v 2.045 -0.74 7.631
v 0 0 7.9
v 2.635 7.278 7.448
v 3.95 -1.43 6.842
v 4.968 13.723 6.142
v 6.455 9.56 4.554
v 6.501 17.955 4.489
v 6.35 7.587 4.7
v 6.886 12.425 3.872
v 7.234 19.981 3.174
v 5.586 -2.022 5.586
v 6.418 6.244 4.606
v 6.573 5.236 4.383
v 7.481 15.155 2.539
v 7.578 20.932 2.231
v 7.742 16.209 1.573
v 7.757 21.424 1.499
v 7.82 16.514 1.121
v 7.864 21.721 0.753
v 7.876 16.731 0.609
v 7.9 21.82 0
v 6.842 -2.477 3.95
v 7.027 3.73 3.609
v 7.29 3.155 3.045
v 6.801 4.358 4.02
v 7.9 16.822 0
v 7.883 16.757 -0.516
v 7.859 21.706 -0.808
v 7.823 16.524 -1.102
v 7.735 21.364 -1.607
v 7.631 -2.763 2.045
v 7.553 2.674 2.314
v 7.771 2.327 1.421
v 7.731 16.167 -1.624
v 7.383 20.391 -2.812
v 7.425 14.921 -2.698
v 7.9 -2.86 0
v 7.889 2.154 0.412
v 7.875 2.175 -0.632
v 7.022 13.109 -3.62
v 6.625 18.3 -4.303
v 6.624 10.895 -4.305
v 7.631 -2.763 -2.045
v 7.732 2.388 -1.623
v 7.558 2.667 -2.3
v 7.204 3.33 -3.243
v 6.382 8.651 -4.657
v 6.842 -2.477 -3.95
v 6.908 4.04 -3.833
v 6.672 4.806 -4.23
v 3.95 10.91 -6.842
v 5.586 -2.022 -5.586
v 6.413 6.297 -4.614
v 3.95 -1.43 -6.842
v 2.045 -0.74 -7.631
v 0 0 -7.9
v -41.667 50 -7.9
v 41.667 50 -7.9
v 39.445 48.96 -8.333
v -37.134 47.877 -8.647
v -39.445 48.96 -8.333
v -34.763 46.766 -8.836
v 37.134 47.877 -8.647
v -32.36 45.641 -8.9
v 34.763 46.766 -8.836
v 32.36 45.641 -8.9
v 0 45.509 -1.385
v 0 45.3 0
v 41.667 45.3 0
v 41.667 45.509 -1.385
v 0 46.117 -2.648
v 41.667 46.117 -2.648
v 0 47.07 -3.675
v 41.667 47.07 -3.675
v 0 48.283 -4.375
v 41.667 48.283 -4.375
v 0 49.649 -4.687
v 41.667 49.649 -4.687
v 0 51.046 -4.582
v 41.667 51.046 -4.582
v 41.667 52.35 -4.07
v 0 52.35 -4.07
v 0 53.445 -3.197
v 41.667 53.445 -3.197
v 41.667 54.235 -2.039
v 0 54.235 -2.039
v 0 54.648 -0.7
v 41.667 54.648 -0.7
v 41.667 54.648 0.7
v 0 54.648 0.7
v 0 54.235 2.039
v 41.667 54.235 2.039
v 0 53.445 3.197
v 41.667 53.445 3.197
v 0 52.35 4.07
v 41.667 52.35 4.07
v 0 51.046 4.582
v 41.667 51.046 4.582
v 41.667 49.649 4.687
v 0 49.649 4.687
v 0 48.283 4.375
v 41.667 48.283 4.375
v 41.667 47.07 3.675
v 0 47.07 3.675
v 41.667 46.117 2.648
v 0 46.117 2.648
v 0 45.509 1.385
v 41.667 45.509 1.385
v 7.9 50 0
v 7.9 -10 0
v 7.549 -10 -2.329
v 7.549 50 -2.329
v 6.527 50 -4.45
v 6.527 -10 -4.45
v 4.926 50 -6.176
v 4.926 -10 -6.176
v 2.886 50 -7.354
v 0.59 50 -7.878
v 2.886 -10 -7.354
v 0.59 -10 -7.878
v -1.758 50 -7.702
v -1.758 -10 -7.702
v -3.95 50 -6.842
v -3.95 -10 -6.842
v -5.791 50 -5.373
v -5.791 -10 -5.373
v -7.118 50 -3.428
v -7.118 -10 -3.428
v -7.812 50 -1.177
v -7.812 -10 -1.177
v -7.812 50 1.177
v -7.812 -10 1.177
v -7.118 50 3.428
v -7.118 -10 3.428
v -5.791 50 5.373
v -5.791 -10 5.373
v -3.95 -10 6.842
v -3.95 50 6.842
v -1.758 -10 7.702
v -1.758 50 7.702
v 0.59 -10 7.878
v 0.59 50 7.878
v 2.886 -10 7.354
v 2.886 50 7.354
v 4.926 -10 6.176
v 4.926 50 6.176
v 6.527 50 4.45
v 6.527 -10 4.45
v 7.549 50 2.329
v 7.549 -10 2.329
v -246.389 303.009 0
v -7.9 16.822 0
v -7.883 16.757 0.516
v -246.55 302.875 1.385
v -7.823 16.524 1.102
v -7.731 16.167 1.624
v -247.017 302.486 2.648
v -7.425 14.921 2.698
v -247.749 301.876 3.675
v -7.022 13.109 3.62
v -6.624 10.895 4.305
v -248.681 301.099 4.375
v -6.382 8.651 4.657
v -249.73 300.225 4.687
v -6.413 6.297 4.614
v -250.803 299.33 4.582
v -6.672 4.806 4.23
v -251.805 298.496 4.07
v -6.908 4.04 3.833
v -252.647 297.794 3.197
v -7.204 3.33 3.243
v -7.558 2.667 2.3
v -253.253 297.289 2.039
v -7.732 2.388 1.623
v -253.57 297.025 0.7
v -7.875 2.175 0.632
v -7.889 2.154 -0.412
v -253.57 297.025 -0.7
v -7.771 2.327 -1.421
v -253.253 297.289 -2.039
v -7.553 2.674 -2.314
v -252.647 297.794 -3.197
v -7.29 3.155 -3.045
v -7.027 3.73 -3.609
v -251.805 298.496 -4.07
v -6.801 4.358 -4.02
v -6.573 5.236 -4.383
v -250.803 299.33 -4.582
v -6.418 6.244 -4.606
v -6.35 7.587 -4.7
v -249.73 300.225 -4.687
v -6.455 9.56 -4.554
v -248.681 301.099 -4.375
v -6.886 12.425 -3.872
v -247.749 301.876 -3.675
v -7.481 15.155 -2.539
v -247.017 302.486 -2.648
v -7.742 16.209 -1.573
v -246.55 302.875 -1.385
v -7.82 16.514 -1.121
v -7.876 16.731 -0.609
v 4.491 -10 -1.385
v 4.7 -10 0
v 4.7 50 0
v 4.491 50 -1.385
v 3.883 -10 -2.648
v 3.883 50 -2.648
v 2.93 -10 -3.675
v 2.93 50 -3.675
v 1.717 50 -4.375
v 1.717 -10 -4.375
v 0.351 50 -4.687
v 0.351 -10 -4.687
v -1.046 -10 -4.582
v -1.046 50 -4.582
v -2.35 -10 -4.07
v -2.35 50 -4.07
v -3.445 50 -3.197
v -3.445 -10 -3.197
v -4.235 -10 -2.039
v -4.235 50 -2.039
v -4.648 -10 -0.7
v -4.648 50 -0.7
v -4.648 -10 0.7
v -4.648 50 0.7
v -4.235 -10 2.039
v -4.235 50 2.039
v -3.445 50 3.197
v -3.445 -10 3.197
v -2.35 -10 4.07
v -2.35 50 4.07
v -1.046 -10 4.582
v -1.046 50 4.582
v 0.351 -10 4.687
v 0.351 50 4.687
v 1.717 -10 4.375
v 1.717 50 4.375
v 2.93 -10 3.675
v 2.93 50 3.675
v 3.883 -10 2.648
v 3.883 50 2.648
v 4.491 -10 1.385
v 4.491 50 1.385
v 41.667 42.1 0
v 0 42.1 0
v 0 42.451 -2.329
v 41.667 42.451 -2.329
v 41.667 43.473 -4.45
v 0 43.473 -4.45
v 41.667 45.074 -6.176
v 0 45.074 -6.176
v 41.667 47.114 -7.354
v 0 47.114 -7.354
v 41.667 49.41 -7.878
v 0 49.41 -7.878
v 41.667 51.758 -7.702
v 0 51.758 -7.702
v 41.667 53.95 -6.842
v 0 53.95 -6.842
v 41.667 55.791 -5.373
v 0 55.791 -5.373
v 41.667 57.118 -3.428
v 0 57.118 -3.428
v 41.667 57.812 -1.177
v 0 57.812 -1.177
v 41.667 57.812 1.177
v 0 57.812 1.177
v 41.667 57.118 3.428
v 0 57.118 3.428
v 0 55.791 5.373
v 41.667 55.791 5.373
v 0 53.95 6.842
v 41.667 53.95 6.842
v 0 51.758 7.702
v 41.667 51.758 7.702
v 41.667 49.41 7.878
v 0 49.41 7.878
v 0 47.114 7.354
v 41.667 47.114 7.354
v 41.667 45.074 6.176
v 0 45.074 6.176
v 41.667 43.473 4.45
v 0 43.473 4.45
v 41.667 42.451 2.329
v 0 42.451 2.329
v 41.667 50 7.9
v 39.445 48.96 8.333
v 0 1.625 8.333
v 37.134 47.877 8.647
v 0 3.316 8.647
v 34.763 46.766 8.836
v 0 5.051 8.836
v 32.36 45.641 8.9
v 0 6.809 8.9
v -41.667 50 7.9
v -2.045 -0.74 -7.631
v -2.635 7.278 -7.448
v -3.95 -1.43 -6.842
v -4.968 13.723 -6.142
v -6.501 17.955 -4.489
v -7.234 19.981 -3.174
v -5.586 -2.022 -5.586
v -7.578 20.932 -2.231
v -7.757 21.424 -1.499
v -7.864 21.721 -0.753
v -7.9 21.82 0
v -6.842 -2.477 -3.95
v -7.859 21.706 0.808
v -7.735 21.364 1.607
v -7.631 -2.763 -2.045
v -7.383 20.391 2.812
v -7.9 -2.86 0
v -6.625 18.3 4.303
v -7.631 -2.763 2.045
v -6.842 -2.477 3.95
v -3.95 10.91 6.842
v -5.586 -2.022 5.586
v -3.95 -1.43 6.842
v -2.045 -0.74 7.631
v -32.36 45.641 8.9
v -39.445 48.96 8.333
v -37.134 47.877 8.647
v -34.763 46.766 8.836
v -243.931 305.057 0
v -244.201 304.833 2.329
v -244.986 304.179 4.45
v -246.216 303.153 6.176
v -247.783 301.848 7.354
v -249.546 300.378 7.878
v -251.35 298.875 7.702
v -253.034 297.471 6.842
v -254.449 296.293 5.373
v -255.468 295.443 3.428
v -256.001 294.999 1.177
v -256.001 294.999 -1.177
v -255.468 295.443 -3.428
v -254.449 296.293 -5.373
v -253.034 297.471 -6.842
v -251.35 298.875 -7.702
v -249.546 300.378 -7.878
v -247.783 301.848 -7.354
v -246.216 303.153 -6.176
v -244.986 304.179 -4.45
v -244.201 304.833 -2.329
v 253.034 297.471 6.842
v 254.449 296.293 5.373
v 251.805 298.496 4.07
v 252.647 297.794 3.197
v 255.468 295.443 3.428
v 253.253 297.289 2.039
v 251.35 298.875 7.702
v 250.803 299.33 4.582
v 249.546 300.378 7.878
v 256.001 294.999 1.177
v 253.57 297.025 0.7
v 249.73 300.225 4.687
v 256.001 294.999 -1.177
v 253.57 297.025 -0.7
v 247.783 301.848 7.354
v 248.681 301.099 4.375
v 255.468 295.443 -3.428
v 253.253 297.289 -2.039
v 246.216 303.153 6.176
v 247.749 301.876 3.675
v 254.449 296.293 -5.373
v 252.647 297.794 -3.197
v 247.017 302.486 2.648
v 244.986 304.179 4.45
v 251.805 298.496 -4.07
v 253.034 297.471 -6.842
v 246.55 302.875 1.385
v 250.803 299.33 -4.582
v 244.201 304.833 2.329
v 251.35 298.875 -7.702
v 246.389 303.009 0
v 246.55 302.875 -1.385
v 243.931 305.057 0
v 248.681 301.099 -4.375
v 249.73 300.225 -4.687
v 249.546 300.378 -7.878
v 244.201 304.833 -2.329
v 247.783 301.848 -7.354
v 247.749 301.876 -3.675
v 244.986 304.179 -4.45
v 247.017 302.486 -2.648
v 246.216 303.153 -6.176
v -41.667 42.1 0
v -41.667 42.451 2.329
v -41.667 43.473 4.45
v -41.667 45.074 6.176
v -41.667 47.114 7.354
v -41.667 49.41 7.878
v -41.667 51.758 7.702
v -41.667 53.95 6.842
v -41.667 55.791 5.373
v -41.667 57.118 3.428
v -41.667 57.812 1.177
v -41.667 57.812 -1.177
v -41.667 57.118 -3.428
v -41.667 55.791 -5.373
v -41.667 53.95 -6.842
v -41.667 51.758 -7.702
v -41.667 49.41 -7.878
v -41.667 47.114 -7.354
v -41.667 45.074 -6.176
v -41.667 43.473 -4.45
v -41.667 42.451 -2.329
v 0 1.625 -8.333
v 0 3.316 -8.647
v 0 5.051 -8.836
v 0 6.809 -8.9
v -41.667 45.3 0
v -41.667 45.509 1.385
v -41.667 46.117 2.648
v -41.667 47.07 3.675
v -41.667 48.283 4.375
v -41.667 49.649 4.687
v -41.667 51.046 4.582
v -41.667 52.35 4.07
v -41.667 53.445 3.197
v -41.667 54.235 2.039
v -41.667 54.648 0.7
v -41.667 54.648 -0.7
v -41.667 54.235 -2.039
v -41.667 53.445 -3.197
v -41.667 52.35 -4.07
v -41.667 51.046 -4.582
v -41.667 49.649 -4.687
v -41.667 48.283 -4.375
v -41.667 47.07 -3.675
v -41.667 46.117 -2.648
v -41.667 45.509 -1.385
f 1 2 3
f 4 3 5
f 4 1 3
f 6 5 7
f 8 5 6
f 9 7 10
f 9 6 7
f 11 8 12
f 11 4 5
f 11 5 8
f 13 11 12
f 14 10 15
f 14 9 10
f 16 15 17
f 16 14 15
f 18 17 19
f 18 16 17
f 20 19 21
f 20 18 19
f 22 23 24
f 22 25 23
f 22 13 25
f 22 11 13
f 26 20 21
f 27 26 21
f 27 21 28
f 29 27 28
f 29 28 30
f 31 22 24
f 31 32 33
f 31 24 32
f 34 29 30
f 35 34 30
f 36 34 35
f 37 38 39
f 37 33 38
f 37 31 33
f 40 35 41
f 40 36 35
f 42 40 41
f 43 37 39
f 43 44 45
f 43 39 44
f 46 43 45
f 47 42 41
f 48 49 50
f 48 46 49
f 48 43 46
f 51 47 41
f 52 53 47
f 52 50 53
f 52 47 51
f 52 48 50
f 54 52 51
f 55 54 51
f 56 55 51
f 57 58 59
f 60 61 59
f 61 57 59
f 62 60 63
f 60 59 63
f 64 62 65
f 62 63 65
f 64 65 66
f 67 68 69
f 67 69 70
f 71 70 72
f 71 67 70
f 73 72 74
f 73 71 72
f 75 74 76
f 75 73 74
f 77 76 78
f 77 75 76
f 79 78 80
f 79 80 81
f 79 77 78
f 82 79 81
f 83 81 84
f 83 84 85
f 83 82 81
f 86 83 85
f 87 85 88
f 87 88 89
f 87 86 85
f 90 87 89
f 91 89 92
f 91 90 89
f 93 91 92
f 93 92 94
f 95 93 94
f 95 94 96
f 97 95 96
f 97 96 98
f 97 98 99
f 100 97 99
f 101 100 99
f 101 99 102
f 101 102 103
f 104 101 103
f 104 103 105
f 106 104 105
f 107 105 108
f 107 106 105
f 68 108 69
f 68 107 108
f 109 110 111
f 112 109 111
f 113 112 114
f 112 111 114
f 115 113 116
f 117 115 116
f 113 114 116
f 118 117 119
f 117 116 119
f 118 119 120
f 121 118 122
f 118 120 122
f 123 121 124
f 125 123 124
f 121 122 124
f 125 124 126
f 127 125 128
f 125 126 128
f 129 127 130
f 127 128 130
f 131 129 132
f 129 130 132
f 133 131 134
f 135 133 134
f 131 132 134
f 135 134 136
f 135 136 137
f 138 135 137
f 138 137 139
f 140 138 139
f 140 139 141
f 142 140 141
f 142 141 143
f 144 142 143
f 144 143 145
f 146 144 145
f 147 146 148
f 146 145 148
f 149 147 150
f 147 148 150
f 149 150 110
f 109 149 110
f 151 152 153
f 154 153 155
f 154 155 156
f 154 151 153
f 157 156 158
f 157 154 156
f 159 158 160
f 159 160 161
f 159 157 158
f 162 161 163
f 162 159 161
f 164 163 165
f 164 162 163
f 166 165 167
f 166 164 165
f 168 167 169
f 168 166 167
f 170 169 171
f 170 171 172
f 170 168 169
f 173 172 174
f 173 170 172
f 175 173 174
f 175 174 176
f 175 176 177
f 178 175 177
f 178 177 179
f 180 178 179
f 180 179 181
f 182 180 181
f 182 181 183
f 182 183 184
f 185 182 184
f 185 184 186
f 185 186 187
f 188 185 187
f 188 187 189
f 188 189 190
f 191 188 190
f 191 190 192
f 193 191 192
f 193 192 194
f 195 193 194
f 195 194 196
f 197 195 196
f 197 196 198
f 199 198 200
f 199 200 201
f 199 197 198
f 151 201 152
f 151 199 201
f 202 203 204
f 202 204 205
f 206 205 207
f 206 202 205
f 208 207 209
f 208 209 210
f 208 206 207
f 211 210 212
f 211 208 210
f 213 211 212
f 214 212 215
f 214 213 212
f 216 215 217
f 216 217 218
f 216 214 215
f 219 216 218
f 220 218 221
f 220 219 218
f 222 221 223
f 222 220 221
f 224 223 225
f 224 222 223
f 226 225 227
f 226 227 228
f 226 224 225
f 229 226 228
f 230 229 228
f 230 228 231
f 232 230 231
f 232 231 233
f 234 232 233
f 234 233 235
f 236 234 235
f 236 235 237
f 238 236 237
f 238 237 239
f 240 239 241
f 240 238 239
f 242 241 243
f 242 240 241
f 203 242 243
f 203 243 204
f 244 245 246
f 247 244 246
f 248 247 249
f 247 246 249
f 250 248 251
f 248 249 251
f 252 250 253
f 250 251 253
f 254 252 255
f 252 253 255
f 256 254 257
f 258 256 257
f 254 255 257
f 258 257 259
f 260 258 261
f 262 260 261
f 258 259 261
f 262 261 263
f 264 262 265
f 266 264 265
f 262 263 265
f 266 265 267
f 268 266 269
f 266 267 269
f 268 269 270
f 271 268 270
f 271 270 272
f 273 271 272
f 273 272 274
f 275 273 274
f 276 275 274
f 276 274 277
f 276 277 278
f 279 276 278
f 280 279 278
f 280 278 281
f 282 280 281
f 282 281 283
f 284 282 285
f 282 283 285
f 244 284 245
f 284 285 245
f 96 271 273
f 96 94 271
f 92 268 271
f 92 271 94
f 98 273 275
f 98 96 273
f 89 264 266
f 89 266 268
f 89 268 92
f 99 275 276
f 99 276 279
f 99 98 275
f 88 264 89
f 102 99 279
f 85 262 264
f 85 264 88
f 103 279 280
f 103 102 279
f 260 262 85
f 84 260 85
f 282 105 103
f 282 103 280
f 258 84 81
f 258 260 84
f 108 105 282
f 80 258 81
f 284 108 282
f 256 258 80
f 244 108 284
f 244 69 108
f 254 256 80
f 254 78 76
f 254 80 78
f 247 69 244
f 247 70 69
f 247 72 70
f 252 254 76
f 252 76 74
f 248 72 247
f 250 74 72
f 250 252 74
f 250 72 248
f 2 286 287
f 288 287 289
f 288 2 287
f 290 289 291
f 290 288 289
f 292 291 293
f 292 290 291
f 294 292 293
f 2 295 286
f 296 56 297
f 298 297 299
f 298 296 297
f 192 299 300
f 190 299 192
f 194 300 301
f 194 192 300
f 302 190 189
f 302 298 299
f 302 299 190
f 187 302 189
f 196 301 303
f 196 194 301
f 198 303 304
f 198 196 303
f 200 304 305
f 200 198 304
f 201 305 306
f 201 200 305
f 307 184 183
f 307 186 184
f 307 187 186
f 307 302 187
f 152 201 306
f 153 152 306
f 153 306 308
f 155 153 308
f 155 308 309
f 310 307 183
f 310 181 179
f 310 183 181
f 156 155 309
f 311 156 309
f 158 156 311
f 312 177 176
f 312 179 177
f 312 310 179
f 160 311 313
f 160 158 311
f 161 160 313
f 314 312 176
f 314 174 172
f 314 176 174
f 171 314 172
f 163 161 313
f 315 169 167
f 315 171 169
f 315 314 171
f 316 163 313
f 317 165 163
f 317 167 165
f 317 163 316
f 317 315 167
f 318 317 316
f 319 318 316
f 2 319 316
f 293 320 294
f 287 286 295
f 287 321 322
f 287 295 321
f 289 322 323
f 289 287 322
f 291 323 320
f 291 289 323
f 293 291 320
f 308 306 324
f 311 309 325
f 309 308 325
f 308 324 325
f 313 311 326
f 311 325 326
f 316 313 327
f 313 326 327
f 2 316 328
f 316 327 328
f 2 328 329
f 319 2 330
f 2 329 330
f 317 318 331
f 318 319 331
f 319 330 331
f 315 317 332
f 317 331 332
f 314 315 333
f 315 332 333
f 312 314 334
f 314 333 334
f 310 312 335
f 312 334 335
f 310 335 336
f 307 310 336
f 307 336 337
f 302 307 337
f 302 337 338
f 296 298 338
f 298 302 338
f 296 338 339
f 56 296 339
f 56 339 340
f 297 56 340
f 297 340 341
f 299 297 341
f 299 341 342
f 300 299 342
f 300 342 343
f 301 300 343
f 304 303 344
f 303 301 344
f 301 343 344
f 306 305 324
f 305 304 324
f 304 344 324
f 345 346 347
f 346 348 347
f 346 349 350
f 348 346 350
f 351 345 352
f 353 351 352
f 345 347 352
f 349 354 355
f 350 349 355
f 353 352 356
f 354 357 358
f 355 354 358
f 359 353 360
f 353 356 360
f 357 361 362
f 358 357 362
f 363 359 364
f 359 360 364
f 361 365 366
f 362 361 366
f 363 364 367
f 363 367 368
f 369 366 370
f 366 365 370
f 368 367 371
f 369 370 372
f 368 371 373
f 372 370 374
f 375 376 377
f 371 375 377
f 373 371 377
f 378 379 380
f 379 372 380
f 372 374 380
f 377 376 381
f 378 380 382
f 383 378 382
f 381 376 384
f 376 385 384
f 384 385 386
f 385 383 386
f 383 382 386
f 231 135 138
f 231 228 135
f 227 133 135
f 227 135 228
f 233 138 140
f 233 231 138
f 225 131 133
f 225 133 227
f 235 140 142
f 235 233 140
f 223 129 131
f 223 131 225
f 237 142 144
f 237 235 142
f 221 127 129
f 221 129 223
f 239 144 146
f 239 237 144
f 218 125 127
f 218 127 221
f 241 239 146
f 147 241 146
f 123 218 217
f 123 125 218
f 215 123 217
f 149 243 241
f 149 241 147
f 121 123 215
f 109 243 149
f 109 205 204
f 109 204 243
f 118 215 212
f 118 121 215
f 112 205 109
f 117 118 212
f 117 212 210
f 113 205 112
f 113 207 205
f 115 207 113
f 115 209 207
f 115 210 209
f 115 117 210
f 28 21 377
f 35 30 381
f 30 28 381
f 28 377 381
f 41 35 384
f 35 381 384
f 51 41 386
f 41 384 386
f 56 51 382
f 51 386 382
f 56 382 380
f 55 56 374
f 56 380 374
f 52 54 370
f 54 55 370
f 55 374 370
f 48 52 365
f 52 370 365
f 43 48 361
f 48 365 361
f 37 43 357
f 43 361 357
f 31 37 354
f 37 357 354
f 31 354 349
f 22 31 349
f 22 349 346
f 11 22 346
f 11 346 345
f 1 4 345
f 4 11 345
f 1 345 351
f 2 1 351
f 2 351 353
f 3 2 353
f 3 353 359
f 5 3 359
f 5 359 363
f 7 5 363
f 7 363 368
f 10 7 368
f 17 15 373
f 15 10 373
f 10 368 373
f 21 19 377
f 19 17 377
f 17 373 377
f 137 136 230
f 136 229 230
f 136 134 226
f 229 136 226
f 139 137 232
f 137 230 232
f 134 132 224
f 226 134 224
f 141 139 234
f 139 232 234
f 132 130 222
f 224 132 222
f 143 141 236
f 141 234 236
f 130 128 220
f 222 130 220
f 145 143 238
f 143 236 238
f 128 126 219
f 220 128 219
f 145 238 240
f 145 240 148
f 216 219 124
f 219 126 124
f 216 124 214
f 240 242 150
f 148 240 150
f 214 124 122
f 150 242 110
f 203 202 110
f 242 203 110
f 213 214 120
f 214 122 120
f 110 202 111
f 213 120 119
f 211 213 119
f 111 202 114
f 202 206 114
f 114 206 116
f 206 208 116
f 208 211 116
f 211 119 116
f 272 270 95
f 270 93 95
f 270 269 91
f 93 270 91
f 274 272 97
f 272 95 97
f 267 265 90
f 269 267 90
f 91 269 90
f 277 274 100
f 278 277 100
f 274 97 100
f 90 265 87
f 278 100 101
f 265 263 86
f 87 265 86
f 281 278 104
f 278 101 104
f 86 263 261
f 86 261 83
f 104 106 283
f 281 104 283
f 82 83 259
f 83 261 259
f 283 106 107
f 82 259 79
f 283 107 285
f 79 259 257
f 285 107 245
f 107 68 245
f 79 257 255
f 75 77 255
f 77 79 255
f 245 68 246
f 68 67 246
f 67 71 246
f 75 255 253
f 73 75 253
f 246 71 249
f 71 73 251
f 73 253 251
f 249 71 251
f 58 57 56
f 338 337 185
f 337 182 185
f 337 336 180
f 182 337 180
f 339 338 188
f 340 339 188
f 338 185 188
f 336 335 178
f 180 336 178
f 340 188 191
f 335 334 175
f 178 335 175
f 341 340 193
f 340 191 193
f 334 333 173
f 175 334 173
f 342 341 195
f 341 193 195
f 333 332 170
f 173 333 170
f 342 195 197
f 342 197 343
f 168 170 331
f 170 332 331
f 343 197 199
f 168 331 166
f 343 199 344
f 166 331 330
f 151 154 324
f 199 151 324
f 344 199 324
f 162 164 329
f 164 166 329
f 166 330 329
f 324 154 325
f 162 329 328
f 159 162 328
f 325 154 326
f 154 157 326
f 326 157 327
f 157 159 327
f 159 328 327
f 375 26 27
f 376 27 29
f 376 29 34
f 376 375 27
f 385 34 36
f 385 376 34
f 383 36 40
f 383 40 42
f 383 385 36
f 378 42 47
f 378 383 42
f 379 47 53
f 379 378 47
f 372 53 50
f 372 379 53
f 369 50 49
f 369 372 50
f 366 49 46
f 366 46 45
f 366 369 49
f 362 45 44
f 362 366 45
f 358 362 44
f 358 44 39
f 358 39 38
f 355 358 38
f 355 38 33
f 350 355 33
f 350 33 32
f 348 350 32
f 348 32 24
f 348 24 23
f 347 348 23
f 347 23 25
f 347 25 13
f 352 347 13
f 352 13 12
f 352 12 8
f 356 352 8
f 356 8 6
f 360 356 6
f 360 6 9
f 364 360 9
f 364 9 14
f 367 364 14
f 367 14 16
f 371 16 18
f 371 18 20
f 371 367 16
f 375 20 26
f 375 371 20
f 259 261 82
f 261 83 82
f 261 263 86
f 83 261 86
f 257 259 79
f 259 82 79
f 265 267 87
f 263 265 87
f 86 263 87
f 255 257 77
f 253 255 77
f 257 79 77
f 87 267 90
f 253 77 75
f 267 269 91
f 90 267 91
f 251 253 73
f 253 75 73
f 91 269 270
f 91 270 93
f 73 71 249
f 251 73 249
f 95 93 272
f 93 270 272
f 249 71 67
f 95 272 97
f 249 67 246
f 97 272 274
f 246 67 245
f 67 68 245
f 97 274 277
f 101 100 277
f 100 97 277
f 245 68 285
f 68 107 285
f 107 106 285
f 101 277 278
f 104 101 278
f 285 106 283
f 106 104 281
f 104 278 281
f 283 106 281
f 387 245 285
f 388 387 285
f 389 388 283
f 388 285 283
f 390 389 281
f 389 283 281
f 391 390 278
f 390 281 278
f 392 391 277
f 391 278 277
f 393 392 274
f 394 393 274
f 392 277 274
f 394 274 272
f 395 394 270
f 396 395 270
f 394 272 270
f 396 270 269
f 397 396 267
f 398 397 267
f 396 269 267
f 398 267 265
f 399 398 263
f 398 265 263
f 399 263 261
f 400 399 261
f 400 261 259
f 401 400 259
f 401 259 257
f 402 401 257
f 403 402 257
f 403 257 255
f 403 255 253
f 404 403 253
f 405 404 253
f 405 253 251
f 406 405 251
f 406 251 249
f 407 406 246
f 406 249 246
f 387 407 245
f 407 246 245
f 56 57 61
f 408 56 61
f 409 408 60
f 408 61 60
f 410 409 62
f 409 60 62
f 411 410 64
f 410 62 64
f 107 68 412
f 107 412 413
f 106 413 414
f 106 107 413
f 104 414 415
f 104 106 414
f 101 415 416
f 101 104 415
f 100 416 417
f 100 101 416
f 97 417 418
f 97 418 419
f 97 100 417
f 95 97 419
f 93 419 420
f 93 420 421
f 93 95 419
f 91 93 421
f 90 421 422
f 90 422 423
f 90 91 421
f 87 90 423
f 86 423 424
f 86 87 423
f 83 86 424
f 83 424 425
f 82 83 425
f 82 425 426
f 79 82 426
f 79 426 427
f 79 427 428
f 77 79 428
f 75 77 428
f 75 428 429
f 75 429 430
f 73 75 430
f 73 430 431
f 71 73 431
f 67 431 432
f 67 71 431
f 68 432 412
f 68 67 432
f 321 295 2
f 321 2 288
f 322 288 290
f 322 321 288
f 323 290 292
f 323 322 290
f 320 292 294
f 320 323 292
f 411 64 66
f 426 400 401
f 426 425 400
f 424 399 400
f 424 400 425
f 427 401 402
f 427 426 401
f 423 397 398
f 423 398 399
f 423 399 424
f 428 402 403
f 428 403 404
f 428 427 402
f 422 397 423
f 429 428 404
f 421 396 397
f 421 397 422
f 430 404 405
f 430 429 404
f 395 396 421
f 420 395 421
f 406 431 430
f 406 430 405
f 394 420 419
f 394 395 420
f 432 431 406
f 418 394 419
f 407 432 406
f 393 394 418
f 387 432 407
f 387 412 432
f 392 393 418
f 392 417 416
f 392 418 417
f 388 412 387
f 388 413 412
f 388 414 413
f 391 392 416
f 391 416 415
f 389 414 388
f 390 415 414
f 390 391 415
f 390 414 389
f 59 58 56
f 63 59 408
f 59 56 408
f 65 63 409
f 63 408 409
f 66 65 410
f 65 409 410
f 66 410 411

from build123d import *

# Parameters (mm, degrees)
FSAE_START                         = -390.512483795
FSAE_TUBE_15_8X3_2_4_OUTLINE_R     = 7.9
FSAE_TUBE_15_8X3_2_4_OUTLINE_R_2   = 4.7
FSAE_TUBE_15_8X3_2_4_DEPTH         = 390.512483895
FSAE_START_2                       = -6
FSAE_TUBE_15_8X3_2_4_2_DEPTH       = 29
FSAE_START_3                       = -10
FSAE_TUBE_15_8X3_2_4_3_OUTLINE_R   = 7.9
FSAE_TUBE_15_8X3_2_4_3_OUTLINE_R_2 = 4.7
FSAE_TUBE_15_8X3_2_4_3_DEPTH       = 60
SKETCH14_R                         = 7.9
SKETCH14_R_2                       = 4.7
FSAE_TUBE_15_8X3_2_5_DEPTH         = 41.666666667
MIRROR2_ANGLE                      = 180
MIRROR2_2_ANGLE                    = 180
BOSS_EXTRUDE2_DEPTH                = 1
FILLET1_R                          = 10


with BuildPart() as part:
    # Fsae tube 15.8X3.2(4): read off the stored shape, not the designer's step
    # Fsae tube 15.8X3.2(4) outline → Fsae tube 15.8X3.2(4) (new body)
    with BuildSketch(Plane(origin=(0, 0, 0), x_dir=(0.7682212795973756, 0.6401843996644802, 0), z_dir=(0.64018439966448, -0.7682212795973759, 0)).offset(FSAE_START)):
        Circle(FSAE_TUBE_15_8X3_2_4_OUTLINE_R)
        Circle(FSAE_TUBE_15_8X3_2_4_OUTLINE_R_2, mode=Mode.SUBTRACT)
    extrude(amount=FSAE_TUBE_15_8X3_2_4_DEPTH)

    # Fsae tube 15.8X3.2_4 2 outline → Fsae tube 15.8X3.2_4 2 (cut)
    with BuildSketch(Plane(origin=(0, 0, 0), x_dir=(1, 0, 0), z_dir=(0, 1, 0)).offset(FSAE_START_2)):
        with BuildLine():
            Line((8, 7.9), (0, 7.9))
            ThreePointArc((0, 7.9), (-7.9, 0), (0, -7.9))
            Line((0, -7.9), (8, -7.9))
            Line((8, -7.9), (8, 7.9))
        make_face()
    extrude(amount=FSAE_TUBE_15_8X3_2_4_2_DEPTH, mode=Mode.SUBTRACT)


with BuildPart() as body_2:
    # Fsae tube 15.8X3.2_4 3 outline → Fsae tube 15.8X3.2_4 3 (new body)
    with BuildSketch(Plane(origin=(0, 0, 0), x_dir=(1, 0, 0), z_dir=(0, 1, 0)).offset(FSAE_START_3)):
        Circle(FSAE_TUBE_15_8X3_2_4_3_OUTLINE_R)
        Circle(FSAE_TUBE_15_8X3_2_4_3_OUTLINE_R_2, mode=Mode.SUBTRACT)
    extrude(amount=FSAE_TUBE_15_8X3_2_4_3_DEPTH)


with BuildPart() as body_3:
    # Sketch14 → Fsae tube 15.8X3.2(5) (new body)
    with BuildSketch(Plane(origin=(0, 50, 0), x_dir=(0, -1, 0), z_dir=(-1, 0, 0))):
        Circle(SKETCH14_R)
        Circle(SKETCH14_R_2, mode=Mode.SUBTRACT)
    extrude(amount=FSAE_TUBE_15_8X3_2_5_DEPTH)


with BuildPart() as body_4:
    # Mirror2: read off the stored shape, not the designer's step
    # Mirror2: copy of body 3
    add(body_3.part.rotate(Axis((0, 0, 0), (0, 1, 0)), MIRROR2_ANGLE))


with BuildPart() as body_5:
    # Mirror2 2: copy of part
    add(part.part.rotate(Axis((0, 0, 0), (0, 1, 0)), MIRROR2_2_ANGLE))


with BuildPart() as body_6:
    # Sketch15 → Boss-Extrude2 (new body)
    with BuildSketch(Plane.XY.offset(-7.9)):
        Polygon((-41.666666667, 50), (0, 0), (41.666666667, 50), align=None)
    extrude(amount=-BOSS_EXTRUDE2_DEPTH)

    # Fillet1
    # the kernel refuses this fillet: 10 mm, written as the material it takes off along each edge
    with BuildSketch(Plane(origin=(52.563914026, 50, -8.9), x_dir=(0, 0, 1), z_dir=(-1, 0, 0))) as fillet1_piece_1:
        with BuildLine():
            CenterArc((10, -4.358898944), FILLET1_R, 154.158067237, 25.841932763)
            Line((0, -4.358898944), (-0.2, -4.358898944))
            Line((-0.2, -4.358898944), (-0.2, 0))
            Line((-0.2, 0), (0, 0.2))
            ThreePointArc((0, 0.2), (0.5, 0.2), (0.82, 0.087177979))
            Line((0.82, 0.087177979), (1, 0))
        make_face()
    extrude(amount=105.127828051, mode=Mode.SUBTRACT)
    with BuildSketch(Plane(origin=(-48.642914425, 58.37149731, -8.9), x_dir=(0, 0, 1), z_dir=(0.6401843996644797, -0.768221279597376, 0)), Plane(origin=(-6.976247758, -8.37149731, -8.9), x_dir=(0, 0, 1), z_dir=(0.64018439966448, 0.7682212795973759, 0))) as fillet1_piece_2:
        with BuildLine():
            CenterArc((10, -4.358898944), FILLET1_R, 154.158067237, 25.841932763)
            Line((0, -4.358898944), (-0.2, -4.358898944))
            Line((-0.2, -4.358898944), (-0.2, 0))
            Line((-0.2, 0), (0, 0.2))
            ThreePointArc((0, 0.2), (0.5, 0.2), (0.82, 0.087177979))
            Line((0.82, 0.087177979), (1, 0))
        make_face()
    extrude(amount=86.879908684, mode=Mode.SUBTRACT)


with BuildPart() as body_7:
    # Mirror3: mirrored copy
    add(body_6.part.mirror(Plane.XY))


solid = Compound([part.part, body_2.part, body_3.part, body_4.part, body_5.part, body_6.part, body_7.part])
